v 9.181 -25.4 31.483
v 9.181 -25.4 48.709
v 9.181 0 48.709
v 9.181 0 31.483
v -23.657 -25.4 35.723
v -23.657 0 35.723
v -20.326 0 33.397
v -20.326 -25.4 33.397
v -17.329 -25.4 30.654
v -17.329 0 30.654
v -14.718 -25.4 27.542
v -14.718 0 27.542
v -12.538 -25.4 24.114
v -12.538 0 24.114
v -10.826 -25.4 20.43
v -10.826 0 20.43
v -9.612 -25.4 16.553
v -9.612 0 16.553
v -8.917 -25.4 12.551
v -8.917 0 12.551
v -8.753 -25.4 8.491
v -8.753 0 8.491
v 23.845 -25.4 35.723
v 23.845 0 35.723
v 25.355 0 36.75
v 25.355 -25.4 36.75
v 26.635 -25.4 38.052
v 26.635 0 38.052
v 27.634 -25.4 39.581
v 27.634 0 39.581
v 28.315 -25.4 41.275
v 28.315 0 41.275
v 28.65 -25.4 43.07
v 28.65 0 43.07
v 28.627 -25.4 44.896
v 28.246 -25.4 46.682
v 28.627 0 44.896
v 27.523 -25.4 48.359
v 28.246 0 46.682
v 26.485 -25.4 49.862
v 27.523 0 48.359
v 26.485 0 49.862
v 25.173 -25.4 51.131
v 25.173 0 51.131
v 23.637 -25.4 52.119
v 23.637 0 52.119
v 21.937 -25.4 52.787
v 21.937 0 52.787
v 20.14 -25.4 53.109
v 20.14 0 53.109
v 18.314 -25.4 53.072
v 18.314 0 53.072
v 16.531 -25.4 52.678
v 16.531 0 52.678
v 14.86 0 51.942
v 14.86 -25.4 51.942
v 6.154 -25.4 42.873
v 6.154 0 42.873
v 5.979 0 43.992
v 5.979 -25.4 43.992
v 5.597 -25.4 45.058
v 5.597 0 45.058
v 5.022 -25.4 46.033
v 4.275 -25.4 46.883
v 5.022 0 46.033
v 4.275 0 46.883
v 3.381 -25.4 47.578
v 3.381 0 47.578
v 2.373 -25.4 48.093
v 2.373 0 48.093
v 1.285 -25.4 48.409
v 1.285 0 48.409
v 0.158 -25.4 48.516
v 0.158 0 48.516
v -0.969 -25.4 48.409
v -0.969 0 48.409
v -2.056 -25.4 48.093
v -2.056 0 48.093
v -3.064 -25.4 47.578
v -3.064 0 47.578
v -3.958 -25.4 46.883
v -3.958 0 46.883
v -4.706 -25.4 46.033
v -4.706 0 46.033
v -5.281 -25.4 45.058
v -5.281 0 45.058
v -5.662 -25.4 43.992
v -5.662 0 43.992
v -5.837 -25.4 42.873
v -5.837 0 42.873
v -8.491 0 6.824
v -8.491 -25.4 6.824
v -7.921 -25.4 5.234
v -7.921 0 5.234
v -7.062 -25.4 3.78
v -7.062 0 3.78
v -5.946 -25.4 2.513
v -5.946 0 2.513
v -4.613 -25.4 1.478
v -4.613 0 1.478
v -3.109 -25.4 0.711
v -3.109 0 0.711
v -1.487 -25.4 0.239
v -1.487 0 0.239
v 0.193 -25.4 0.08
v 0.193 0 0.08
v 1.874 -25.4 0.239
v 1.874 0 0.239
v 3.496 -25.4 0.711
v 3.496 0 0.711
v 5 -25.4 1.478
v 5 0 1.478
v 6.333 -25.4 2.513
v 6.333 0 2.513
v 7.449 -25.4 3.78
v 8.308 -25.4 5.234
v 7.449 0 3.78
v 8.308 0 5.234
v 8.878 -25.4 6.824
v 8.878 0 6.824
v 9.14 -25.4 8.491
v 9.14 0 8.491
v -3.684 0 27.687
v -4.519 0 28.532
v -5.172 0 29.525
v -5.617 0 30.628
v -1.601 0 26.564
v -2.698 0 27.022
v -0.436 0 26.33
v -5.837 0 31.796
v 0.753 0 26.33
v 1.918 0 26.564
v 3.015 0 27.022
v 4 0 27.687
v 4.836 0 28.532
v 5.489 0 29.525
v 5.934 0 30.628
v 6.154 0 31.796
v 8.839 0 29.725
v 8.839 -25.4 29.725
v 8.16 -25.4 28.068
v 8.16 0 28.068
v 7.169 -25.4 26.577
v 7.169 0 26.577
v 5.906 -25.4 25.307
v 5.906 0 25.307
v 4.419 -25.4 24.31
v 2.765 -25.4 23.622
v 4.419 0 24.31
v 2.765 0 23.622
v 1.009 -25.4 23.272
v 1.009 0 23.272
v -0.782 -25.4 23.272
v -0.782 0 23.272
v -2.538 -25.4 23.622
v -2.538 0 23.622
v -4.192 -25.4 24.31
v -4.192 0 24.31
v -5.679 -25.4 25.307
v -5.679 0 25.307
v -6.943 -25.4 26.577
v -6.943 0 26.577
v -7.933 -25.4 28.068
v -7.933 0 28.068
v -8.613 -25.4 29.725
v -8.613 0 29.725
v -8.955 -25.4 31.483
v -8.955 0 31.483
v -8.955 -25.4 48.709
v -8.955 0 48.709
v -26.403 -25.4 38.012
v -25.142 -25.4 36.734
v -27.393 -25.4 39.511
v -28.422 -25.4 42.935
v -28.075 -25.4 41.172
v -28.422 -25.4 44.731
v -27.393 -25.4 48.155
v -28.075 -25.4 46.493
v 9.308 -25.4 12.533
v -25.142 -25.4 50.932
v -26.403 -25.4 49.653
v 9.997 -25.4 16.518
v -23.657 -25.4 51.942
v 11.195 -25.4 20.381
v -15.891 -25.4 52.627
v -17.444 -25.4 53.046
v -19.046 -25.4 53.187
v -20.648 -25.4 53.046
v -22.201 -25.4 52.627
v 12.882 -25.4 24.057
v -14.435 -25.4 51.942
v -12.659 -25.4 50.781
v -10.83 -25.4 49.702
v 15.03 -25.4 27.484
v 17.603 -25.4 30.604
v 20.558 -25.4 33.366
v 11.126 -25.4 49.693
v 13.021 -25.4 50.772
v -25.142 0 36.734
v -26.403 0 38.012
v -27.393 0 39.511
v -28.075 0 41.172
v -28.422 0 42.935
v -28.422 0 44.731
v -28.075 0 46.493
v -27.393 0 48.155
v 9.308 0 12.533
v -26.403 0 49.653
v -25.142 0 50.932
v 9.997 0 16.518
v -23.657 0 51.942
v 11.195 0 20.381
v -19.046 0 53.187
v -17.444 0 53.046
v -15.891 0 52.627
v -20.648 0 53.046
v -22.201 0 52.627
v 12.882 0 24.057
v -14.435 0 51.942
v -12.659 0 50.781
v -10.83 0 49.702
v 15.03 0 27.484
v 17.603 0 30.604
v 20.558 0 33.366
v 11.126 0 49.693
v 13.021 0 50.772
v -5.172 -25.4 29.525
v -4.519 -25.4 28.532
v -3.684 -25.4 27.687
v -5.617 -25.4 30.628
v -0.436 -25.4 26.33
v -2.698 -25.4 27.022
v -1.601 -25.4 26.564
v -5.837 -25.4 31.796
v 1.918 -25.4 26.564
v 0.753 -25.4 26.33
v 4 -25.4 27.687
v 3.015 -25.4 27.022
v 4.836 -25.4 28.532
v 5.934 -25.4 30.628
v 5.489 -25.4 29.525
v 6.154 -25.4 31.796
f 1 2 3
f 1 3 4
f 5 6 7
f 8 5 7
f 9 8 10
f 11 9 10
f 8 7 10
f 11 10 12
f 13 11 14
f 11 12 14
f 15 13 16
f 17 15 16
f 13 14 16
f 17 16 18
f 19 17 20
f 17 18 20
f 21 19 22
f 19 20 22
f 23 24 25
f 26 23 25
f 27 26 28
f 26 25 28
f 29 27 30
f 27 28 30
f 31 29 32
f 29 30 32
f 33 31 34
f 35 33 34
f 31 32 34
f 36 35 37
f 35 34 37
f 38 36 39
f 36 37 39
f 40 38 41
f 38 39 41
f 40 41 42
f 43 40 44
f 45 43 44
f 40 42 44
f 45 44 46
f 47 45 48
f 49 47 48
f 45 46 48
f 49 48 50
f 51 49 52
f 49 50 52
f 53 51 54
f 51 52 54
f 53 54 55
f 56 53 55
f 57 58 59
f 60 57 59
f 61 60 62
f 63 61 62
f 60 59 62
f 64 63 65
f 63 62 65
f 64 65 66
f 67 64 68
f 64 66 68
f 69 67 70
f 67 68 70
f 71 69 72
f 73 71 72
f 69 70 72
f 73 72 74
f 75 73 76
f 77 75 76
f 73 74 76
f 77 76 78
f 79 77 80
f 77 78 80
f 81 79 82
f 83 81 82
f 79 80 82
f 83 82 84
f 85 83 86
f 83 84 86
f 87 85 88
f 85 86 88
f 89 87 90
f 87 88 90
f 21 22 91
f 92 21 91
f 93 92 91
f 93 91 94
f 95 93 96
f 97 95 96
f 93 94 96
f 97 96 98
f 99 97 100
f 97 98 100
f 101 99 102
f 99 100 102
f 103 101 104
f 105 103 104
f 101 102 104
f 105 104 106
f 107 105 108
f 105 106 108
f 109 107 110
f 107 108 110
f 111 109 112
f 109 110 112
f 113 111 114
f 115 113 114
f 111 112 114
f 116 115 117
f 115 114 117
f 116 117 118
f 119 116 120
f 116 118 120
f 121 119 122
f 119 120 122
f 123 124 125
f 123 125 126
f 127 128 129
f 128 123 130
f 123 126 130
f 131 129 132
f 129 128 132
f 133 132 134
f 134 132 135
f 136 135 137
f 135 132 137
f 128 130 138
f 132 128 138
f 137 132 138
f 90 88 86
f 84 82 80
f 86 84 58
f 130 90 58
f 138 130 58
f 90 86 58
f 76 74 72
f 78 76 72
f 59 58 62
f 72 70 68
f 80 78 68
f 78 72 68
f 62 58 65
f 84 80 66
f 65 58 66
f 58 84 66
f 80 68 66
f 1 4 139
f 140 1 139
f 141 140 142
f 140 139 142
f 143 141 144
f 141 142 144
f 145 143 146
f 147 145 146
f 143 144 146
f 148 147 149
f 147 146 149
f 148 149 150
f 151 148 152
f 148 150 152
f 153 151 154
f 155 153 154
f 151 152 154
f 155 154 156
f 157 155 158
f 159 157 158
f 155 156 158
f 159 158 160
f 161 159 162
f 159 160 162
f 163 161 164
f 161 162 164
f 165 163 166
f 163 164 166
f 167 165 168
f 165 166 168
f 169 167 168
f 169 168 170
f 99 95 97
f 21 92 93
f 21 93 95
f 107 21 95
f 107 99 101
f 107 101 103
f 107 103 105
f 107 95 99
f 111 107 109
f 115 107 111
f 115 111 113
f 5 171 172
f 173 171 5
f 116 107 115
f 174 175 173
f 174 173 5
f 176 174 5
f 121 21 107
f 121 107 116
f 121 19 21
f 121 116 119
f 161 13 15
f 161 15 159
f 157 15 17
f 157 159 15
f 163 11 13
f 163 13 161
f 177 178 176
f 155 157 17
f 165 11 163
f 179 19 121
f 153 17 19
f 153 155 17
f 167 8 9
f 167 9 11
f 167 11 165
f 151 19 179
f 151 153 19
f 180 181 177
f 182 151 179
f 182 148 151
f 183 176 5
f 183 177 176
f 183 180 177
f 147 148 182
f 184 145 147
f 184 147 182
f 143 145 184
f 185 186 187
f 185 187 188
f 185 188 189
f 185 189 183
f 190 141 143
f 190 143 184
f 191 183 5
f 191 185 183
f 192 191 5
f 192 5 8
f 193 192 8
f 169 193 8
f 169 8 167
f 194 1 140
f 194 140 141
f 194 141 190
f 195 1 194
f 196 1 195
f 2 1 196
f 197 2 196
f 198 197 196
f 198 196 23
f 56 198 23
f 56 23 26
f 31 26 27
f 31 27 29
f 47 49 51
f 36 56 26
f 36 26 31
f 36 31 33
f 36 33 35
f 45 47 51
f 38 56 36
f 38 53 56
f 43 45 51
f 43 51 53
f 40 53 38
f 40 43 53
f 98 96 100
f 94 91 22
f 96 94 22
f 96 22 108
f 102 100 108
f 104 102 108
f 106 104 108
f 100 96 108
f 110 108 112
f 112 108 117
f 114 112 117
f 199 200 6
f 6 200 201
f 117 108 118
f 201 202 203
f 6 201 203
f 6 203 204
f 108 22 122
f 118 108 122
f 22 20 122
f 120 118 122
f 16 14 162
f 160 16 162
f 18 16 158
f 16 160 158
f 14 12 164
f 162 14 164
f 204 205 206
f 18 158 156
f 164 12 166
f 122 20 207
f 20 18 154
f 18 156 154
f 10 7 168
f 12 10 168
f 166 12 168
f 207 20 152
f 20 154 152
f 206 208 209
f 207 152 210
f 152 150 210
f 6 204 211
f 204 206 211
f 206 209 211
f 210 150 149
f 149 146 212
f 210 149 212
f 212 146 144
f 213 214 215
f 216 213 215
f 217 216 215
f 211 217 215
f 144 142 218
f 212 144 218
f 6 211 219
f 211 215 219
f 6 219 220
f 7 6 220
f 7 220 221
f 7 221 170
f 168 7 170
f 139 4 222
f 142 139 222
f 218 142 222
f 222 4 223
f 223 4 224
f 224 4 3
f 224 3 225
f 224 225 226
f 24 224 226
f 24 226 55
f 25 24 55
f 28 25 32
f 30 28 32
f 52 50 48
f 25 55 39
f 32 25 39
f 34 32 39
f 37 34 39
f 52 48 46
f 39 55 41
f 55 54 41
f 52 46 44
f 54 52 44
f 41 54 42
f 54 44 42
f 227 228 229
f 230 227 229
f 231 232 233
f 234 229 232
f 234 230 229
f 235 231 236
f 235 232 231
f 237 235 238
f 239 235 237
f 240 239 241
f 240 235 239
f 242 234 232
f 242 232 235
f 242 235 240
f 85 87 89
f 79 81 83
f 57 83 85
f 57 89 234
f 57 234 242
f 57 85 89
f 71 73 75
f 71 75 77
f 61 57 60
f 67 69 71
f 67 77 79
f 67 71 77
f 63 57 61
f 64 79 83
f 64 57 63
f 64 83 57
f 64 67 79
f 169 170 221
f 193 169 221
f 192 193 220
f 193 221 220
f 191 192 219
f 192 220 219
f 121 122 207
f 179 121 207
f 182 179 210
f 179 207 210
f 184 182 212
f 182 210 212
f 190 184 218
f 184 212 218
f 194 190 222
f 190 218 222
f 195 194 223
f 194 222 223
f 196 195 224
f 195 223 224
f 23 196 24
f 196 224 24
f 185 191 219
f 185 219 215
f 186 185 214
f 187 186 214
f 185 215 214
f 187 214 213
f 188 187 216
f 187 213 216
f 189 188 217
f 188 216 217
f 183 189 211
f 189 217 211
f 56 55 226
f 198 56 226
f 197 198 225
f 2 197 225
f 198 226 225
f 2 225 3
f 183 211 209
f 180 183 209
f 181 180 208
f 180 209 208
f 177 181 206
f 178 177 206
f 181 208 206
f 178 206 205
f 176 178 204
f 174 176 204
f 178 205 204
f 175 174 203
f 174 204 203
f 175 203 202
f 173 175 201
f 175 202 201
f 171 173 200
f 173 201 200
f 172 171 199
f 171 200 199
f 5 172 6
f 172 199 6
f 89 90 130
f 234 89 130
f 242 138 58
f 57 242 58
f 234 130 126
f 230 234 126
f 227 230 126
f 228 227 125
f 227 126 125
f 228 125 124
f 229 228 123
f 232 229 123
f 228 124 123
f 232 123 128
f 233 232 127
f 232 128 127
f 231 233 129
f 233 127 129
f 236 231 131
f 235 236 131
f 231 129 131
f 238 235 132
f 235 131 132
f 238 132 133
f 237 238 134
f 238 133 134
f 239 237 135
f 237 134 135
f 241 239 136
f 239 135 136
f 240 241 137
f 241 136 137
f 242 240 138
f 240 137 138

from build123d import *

# Parameters (mm, degrees)
F1_DEPTH = 25.4


with BuildPart() as f1:
    # F0 (on Front) → F1 (new body)
    with BuildSketch(Plane.XZ):
        with BuildLine():
            Line((-8.954637, 31.483312), (-8.954637, 48.709152))
            ThreePointArc((-8.954637, 48.709152), (-11.750756, 50.231074), (-14.435124, 51.942417))
            ThreePointArc((-14.435124, 51.942417), (-19.045944, 53.186787), (-23.656765, 51.942417))
            ThreePointArc((-23.656765, 51.942417), (-28.465686, 43.832672), (-23.656765, 35.722926))
            ThreePointArc((-23.656765, 35.722926), (-12.537887, 24.114179), (-8.753396, 8.491436))
            ThreePointArc((-8.753396, 8.491436), (0.193475, 0.080163), (9.140345, 8.491436))
            ThreePointArc((9.140345, 8.491436), (12.881936, 24.056901), (23.84492, 35.722926))
            ThreePointArc((23.84492, 35.722926), (27.523004, 48.35906), (14.859682, 51.942417))
            ThreePointArc((14.859682, 51.942417), (12.080111, 50.221008), (9.181223, 48.709152))
            Line((9.181223, 48.709152), (9.181223, 31.483312))
            ThreePointArc((9.181223, 31.483312), (0.113293, 23.227784), (-8.954637, 31.483312))
        make_face()
        with BuildLine():
            ThreePointArc((6.153792, 42.873443), (0.158365, 48.515675), (-5.837062, 42.873443))
            Line((-5.837062, 42.873443), (-5.837062, 31.795798))
            ThreePointArc((-5.837062, 31.795798), (0.158365, 26.300666), (6.153792, 31.795798))
            Line((6.153792, 31.795798), (6.153792, 42.873443))
        make_face()
    extrude(amount=F1_DEPTH)


solid = f1.part
